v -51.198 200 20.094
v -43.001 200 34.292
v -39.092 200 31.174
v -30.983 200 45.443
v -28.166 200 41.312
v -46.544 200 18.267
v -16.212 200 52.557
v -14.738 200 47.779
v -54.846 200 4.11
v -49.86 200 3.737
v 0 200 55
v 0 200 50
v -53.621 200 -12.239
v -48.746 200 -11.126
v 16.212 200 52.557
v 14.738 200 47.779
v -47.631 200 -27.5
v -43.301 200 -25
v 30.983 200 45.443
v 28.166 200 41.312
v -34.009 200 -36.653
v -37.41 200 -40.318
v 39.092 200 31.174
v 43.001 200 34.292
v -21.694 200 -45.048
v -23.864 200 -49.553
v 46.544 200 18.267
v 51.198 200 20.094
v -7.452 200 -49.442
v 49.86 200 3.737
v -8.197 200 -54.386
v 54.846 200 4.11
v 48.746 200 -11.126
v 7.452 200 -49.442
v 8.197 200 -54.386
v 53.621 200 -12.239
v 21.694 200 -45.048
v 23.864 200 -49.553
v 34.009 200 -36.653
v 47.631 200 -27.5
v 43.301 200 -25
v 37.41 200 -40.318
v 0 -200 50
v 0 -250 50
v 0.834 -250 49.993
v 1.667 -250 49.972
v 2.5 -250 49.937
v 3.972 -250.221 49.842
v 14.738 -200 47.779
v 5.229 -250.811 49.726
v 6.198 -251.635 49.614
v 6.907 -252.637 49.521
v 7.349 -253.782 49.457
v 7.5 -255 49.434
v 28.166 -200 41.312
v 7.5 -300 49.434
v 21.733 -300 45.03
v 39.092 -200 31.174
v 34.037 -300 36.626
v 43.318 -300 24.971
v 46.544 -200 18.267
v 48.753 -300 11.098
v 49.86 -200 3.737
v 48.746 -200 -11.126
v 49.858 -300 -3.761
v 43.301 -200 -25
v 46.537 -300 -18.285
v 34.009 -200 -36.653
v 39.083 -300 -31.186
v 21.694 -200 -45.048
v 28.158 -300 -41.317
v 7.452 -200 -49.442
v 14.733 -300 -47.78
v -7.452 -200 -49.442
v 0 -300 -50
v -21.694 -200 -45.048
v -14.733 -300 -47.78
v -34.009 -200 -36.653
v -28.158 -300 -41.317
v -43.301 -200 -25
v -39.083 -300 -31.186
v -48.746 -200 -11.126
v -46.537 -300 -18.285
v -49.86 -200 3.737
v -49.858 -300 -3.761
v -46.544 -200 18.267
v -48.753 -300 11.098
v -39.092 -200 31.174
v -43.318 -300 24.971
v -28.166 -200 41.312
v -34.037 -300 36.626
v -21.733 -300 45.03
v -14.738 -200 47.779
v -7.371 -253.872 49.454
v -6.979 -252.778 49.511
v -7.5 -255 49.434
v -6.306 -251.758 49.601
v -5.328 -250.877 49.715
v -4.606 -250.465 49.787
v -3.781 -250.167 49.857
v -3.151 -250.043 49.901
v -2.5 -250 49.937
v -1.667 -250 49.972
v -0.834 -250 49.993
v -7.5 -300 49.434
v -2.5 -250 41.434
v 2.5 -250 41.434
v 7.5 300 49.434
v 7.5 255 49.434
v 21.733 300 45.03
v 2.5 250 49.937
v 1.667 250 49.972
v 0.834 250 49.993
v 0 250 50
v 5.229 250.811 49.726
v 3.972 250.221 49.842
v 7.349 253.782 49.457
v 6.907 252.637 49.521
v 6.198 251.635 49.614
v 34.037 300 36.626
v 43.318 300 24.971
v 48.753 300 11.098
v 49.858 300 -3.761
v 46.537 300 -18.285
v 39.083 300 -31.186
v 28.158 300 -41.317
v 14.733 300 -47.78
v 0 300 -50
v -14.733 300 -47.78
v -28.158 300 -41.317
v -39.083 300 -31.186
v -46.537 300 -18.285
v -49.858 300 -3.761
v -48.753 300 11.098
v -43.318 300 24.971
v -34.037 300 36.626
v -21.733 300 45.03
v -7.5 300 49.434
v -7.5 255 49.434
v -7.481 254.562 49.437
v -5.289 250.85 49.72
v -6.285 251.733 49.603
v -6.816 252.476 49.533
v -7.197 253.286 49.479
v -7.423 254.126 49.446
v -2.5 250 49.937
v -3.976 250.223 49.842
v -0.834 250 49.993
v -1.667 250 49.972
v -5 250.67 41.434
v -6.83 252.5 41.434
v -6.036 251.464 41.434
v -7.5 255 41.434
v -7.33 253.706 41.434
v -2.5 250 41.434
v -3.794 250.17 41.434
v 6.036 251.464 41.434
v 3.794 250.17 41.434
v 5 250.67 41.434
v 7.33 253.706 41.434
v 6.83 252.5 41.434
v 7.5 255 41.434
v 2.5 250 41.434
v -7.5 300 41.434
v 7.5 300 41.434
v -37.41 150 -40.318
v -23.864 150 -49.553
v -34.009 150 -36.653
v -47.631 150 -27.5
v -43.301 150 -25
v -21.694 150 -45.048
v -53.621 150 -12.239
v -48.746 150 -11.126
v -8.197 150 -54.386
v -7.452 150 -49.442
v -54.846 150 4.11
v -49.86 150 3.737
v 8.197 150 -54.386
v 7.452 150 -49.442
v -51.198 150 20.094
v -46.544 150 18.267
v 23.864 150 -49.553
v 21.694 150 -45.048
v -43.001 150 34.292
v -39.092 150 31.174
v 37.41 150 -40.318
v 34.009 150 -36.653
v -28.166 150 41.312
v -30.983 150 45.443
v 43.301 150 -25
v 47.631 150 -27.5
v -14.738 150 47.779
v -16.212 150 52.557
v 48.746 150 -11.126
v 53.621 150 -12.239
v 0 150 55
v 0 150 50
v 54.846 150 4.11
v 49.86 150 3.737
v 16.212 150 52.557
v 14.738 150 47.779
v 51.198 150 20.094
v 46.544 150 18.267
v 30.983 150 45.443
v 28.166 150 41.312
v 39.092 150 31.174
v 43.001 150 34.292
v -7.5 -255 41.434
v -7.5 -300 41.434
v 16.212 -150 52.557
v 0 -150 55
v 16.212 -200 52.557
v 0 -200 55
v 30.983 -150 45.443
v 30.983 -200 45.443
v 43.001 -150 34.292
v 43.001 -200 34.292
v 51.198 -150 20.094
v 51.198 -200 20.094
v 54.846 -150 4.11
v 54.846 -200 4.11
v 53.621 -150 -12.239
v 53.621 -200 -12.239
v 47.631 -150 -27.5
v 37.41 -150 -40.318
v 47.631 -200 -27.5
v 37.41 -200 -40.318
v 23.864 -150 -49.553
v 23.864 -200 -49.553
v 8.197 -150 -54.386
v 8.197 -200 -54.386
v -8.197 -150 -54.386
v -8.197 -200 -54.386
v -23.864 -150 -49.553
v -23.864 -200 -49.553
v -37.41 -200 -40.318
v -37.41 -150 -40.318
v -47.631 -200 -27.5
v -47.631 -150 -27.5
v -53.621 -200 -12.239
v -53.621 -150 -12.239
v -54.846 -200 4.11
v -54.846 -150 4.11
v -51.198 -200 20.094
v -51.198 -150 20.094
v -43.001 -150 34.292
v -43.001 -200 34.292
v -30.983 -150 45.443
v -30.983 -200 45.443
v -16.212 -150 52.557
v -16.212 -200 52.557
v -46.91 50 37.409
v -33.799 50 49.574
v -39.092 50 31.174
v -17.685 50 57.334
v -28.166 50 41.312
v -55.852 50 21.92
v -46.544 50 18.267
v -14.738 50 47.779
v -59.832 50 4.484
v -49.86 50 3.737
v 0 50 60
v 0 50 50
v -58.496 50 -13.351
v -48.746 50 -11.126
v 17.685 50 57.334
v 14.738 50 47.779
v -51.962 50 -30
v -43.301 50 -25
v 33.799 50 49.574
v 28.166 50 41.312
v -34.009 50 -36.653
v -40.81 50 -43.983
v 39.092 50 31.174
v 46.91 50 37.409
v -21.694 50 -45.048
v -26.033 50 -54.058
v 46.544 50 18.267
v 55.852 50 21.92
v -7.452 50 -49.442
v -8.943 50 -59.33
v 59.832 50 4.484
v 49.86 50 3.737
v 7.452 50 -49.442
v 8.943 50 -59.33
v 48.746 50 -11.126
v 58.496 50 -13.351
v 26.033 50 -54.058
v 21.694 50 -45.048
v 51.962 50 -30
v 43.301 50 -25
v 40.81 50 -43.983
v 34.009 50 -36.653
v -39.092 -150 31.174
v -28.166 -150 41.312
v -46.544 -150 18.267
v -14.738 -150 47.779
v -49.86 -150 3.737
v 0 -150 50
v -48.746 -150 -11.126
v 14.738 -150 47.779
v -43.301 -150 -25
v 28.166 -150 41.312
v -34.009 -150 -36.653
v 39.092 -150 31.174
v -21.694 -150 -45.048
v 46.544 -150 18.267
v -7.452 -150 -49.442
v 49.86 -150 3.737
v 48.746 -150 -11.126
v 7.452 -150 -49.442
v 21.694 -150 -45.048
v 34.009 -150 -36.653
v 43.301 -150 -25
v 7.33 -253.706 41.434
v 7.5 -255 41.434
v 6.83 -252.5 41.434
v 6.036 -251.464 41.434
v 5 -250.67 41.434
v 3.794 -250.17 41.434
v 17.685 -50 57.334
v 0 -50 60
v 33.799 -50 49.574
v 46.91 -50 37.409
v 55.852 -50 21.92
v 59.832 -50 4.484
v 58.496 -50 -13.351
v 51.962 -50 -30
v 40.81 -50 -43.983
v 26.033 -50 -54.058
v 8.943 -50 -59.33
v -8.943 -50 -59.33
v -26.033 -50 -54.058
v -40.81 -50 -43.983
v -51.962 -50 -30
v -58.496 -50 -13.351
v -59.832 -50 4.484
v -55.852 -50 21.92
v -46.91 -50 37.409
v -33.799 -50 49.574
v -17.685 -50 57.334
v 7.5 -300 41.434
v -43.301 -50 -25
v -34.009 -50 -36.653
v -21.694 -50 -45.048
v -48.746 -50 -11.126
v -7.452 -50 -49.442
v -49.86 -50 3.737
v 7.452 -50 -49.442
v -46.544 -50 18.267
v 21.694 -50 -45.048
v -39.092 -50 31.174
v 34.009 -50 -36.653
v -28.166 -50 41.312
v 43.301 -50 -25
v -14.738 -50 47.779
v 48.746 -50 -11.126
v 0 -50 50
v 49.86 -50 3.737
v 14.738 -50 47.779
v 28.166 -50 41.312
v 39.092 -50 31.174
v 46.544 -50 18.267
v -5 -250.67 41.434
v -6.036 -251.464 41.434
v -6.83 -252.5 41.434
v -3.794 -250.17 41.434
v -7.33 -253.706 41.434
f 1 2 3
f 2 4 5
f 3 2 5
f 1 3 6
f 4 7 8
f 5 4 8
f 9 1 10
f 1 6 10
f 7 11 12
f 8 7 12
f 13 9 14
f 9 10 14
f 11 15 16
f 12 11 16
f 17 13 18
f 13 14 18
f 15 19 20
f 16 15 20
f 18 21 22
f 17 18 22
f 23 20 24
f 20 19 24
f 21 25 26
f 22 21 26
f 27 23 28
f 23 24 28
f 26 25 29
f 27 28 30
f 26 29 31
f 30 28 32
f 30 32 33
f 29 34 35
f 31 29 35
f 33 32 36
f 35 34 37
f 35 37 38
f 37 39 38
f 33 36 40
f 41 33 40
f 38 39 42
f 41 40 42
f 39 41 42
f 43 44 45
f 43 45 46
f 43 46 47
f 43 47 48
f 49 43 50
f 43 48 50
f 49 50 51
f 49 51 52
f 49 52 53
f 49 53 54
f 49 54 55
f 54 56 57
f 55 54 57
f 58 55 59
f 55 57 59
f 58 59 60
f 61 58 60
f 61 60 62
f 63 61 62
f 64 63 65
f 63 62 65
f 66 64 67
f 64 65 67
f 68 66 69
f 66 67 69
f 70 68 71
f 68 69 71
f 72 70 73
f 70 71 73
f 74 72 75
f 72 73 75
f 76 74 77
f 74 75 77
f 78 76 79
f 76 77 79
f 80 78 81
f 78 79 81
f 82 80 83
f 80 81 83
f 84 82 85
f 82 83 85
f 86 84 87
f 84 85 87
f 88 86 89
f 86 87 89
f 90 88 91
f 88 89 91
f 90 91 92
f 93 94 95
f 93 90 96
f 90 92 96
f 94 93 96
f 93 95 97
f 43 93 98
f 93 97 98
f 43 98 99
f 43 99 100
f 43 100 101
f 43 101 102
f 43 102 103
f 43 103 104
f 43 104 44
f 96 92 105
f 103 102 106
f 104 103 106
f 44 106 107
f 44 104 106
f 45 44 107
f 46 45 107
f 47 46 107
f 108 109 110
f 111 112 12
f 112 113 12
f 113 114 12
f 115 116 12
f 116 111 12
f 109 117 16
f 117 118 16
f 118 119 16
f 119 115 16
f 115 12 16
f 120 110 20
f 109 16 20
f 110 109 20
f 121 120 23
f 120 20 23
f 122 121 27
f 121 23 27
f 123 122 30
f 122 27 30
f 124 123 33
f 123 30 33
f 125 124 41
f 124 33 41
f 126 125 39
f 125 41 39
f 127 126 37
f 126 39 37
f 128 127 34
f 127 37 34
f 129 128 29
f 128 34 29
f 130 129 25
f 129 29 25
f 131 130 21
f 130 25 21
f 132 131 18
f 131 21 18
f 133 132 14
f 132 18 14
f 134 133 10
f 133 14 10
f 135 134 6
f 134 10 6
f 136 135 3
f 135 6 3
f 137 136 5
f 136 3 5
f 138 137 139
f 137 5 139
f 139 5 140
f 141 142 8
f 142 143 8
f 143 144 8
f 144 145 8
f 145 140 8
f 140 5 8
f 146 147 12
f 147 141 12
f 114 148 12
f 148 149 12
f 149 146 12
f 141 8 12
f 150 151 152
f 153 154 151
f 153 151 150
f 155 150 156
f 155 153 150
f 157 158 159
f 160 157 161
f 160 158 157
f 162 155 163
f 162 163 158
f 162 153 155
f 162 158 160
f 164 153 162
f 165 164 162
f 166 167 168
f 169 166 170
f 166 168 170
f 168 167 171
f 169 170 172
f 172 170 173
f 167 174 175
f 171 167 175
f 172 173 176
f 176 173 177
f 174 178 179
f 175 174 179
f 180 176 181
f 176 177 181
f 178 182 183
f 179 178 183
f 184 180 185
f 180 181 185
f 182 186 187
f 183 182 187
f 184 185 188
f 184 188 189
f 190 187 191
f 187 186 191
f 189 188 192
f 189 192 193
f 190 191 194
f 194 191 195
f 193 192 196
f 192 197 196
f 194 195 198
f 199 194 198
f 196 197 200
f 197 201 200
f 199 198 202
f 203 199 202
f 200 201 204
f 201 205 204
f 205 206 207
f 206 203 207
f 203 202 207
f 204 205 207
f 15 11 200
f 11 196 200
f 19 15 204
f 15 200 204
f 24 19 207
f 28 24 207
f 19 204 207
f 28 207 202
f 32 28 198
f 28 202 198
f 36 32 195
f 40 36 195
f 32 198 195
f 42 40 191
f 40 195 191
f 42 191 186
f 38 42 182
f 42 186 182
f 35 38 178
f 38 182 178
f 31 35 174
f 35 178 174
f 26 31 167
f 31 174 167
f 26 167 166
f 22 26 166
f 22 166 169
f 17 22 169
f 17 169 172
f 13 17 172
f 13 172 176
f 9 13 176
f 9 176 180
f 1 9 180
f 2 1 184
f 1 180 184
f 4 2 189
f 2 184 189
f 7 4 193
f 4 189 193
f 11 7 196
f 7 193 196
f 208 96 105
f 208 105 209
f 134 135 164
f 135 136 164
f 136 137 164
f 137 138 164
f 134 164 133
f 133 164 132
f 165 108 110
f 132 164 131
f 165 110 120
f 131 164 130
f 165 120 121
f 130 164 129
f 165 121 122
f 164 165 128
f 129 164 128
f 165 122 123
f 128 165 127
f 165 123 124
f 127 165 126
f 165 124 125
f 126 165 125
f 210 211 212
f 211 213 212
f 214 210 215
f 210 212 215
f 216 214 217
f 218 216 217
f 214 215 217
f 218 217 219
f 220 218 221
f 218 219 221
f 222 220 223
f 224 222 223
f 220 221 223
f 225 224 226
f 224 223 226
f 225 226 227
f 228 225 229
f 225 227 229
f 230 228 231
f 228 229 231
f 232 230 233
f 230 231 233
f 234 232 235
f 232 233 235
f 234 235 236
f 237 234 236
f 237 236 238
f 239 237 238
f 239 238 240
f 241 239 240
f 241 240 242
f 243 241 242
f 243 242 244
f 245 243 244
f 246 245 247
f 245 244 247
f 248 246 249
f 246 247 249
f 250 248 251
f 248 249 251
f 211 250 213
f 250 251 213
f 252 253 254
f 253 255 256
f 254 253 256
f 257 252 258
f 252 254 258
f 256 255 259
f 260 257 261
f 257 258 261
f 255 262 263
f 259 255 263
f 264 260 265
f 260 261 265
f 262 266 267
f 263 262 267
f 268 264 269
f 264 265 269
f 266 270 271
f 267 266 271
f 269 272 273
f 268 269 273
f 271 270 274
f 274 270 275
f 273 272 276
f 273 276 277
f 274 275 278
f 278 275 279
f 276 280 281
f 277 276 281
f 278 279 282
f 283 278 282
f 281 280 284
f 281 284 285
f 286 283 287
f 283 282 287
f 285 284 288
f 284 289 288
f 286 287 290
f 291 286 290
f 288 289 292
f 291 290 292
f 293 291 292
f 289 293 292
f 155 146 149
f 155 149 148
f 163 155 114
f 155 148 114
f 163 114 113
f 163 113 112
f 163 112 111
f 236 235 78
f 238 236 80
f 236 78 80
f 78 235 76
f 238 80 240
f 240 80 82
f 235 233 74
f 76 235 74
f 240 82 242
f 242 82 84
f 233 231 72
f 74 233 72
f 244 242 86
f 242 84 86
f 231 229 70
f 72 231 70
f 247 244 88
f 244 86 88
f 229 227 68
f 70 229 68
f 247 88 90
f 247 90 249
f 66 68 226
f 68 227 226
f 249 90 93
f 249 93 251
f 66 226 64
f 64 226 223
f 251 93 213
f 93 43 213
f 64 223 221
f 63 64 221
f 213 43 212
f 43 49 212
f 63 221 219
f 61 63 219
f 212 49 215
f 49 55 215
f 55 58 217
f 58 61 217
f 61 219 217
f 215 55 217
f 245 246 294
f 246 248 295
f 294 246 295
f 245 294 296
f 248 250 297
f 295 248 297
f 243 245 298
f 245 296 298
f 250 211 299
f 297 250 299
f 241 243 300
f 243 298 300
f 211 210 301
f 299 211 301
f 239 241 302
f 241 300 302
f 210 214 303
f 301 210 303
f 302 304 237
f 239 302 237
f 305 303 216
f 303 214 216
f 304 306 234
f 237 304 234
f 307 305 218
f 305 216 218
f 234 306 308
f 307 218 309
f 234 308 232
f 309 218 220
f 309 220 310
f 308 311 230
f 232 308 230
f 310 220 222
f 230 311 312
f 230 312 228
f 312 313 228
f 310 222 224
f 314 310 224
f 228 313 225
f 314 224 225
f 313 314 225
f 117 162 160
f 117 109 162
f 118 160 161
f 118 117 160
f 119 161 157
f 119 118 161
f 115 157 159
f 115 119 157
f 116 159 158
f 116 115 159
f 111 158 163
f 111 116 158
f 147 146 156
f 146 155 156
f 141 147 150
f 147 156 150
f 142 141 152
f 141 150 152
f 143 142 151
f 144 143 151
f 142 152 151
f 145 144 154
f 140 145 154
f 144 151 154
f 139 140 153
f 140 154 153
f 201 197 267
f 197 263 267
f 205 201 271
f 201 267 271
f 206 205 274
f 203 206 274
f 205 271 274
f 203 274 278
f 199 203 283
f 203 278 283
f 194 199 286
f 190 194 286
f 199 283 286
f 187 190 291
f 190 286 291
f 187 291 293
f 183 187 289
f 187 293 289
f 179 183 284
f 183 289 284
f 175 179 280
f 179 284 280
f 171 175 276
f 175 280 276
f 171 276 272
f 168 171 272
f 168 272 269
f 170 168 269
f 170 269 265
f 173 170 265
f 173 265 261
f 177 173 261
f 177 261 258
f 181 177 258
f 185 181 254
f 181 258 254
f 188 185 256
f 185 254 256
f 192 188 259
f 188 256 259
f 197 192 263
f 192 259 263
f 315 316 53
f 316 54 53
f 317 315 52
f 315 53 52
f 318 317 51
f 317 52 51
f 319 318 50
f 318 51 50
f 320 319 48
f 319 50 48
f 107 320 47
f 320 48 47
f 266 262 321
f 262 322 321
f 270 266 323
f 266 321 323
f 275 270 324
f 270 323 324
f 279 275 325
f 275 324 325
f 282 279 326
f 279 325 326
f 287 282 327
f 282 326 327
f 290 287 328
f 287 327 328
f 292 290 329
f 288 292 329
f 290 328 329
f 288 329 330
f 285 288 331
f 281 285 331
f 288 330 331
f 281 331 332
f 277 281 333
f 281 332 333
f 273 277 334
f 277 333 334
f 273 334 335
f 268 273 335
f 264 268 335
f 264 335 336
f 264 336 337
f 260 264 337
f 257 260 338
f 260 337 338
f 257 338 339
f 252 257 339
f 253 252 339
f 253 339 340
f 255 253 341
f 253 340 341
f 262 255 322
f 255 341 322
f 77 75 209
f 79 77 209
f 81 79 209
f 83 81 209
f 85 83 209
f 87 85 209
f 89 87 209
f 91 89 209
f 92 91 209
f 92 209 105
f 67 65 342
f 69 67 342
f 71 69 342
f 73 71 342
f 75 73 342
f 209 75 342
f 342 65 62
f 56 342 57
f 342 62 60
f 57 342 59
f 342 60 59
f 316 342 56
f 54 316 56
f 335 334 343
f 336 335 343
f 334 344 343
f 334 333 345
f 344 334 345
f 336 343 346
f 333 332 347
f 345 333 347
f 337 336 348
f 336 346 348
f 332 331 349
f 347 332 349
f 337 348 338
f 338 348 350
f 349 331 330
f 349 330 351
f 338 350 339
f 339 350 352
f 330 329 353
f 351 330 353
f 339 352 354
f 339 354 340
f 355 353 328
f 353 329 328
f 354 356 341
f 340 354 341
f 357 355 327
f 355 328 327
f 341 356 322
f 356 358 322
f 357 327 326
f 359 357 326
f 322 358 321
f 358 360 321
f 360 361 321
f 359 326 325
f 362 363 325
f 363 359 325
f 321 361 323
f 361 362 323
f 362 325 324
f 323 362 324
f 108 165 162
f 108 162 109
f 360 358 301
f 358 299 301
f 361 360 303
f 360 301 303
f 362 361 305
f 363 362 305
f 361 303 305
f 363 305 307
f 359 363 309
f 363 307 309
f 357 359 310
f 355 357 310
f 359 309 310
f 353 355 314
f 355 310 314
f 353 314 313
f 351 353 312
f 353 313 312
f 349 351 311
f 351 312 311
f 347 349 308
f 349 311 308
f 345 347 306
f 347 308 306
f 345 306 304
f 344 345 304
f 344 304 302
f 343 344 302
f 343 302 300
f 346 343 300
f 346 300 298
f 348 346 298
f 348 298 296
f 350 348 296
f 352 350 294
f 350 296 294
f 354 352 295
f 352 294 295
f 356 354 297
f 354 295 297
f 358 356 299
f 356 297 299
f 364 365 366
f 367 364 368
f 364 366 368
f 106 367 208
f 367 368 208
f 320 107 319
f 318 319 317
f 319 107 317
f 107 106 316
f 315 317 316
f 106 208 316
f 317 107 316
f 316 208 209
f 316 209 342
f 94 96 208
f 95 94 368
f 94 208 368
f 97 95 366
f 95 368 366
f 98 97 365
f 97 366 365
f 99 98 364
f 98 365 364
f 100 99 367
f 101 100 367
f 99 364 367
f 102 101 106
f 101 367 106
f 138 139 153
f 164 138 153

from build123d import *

# Parameters (mm, degrees)
F3_DEPTH = 50
F4_R     = 5


# Not quite as in the source:
# - a pattern or mirror of a feature is missing from the dataset's text; its kind, count and spacing are read off the source's solid


with BuildPart() as f1:
    # F0 (on Right) → F1 (revolve)
    with BuildSketch(Plane.YZ):
        Polygon((-300, 50), (-300, 0), (300, 0), (300, 50), (200, 50), (200, 55), (150, 55), (150, 50), (50, 50), (50, 60), (-50, 60), (-50, 50), (-150, 50), (-150, 55), (-200, 55), (-200, 50), align=None)
    revolve(axis=Axis((0, 0, 0), (0, 1, 0)))

    # F2 (on face) → F3 (cut)
    with BuildSketch(Plane.XZ.offset(300)):
        with BuildLine():
            Line((-7.5, 41.4342998332), (7.5, 41.4342998332))
            Line((7.5, 41.4342998332), (7.5, 49.4342998332))
            ThreePointArc((7.5, 49.4342998332), (0, 50), (-7.5, 49.4342998332))
            Line((-7.5, 49.4342998332), (-7.5, 41.4342998332))
        make_face()
    f3 = extrude(amount=-F3_DEPTH, mode=Mode.SUBTRACT)

    # F3_copies: F3 across plane
    add(f3.mirror(Plane.ZX), mode=Mode.SUBTRACT)

    # F4
    f4_edges = [f1.edges().sort_by_distance(p)[0] for p in [
        (-7.5, -250, 45.4343),
        (7.5, -250, 45.4343),
        (7.5, 250, 45.4343),
        (-7.5, 250, 45.4343),
    ]]
    fillet(f4_edges, radius=F4_R)


solid = f1.part
